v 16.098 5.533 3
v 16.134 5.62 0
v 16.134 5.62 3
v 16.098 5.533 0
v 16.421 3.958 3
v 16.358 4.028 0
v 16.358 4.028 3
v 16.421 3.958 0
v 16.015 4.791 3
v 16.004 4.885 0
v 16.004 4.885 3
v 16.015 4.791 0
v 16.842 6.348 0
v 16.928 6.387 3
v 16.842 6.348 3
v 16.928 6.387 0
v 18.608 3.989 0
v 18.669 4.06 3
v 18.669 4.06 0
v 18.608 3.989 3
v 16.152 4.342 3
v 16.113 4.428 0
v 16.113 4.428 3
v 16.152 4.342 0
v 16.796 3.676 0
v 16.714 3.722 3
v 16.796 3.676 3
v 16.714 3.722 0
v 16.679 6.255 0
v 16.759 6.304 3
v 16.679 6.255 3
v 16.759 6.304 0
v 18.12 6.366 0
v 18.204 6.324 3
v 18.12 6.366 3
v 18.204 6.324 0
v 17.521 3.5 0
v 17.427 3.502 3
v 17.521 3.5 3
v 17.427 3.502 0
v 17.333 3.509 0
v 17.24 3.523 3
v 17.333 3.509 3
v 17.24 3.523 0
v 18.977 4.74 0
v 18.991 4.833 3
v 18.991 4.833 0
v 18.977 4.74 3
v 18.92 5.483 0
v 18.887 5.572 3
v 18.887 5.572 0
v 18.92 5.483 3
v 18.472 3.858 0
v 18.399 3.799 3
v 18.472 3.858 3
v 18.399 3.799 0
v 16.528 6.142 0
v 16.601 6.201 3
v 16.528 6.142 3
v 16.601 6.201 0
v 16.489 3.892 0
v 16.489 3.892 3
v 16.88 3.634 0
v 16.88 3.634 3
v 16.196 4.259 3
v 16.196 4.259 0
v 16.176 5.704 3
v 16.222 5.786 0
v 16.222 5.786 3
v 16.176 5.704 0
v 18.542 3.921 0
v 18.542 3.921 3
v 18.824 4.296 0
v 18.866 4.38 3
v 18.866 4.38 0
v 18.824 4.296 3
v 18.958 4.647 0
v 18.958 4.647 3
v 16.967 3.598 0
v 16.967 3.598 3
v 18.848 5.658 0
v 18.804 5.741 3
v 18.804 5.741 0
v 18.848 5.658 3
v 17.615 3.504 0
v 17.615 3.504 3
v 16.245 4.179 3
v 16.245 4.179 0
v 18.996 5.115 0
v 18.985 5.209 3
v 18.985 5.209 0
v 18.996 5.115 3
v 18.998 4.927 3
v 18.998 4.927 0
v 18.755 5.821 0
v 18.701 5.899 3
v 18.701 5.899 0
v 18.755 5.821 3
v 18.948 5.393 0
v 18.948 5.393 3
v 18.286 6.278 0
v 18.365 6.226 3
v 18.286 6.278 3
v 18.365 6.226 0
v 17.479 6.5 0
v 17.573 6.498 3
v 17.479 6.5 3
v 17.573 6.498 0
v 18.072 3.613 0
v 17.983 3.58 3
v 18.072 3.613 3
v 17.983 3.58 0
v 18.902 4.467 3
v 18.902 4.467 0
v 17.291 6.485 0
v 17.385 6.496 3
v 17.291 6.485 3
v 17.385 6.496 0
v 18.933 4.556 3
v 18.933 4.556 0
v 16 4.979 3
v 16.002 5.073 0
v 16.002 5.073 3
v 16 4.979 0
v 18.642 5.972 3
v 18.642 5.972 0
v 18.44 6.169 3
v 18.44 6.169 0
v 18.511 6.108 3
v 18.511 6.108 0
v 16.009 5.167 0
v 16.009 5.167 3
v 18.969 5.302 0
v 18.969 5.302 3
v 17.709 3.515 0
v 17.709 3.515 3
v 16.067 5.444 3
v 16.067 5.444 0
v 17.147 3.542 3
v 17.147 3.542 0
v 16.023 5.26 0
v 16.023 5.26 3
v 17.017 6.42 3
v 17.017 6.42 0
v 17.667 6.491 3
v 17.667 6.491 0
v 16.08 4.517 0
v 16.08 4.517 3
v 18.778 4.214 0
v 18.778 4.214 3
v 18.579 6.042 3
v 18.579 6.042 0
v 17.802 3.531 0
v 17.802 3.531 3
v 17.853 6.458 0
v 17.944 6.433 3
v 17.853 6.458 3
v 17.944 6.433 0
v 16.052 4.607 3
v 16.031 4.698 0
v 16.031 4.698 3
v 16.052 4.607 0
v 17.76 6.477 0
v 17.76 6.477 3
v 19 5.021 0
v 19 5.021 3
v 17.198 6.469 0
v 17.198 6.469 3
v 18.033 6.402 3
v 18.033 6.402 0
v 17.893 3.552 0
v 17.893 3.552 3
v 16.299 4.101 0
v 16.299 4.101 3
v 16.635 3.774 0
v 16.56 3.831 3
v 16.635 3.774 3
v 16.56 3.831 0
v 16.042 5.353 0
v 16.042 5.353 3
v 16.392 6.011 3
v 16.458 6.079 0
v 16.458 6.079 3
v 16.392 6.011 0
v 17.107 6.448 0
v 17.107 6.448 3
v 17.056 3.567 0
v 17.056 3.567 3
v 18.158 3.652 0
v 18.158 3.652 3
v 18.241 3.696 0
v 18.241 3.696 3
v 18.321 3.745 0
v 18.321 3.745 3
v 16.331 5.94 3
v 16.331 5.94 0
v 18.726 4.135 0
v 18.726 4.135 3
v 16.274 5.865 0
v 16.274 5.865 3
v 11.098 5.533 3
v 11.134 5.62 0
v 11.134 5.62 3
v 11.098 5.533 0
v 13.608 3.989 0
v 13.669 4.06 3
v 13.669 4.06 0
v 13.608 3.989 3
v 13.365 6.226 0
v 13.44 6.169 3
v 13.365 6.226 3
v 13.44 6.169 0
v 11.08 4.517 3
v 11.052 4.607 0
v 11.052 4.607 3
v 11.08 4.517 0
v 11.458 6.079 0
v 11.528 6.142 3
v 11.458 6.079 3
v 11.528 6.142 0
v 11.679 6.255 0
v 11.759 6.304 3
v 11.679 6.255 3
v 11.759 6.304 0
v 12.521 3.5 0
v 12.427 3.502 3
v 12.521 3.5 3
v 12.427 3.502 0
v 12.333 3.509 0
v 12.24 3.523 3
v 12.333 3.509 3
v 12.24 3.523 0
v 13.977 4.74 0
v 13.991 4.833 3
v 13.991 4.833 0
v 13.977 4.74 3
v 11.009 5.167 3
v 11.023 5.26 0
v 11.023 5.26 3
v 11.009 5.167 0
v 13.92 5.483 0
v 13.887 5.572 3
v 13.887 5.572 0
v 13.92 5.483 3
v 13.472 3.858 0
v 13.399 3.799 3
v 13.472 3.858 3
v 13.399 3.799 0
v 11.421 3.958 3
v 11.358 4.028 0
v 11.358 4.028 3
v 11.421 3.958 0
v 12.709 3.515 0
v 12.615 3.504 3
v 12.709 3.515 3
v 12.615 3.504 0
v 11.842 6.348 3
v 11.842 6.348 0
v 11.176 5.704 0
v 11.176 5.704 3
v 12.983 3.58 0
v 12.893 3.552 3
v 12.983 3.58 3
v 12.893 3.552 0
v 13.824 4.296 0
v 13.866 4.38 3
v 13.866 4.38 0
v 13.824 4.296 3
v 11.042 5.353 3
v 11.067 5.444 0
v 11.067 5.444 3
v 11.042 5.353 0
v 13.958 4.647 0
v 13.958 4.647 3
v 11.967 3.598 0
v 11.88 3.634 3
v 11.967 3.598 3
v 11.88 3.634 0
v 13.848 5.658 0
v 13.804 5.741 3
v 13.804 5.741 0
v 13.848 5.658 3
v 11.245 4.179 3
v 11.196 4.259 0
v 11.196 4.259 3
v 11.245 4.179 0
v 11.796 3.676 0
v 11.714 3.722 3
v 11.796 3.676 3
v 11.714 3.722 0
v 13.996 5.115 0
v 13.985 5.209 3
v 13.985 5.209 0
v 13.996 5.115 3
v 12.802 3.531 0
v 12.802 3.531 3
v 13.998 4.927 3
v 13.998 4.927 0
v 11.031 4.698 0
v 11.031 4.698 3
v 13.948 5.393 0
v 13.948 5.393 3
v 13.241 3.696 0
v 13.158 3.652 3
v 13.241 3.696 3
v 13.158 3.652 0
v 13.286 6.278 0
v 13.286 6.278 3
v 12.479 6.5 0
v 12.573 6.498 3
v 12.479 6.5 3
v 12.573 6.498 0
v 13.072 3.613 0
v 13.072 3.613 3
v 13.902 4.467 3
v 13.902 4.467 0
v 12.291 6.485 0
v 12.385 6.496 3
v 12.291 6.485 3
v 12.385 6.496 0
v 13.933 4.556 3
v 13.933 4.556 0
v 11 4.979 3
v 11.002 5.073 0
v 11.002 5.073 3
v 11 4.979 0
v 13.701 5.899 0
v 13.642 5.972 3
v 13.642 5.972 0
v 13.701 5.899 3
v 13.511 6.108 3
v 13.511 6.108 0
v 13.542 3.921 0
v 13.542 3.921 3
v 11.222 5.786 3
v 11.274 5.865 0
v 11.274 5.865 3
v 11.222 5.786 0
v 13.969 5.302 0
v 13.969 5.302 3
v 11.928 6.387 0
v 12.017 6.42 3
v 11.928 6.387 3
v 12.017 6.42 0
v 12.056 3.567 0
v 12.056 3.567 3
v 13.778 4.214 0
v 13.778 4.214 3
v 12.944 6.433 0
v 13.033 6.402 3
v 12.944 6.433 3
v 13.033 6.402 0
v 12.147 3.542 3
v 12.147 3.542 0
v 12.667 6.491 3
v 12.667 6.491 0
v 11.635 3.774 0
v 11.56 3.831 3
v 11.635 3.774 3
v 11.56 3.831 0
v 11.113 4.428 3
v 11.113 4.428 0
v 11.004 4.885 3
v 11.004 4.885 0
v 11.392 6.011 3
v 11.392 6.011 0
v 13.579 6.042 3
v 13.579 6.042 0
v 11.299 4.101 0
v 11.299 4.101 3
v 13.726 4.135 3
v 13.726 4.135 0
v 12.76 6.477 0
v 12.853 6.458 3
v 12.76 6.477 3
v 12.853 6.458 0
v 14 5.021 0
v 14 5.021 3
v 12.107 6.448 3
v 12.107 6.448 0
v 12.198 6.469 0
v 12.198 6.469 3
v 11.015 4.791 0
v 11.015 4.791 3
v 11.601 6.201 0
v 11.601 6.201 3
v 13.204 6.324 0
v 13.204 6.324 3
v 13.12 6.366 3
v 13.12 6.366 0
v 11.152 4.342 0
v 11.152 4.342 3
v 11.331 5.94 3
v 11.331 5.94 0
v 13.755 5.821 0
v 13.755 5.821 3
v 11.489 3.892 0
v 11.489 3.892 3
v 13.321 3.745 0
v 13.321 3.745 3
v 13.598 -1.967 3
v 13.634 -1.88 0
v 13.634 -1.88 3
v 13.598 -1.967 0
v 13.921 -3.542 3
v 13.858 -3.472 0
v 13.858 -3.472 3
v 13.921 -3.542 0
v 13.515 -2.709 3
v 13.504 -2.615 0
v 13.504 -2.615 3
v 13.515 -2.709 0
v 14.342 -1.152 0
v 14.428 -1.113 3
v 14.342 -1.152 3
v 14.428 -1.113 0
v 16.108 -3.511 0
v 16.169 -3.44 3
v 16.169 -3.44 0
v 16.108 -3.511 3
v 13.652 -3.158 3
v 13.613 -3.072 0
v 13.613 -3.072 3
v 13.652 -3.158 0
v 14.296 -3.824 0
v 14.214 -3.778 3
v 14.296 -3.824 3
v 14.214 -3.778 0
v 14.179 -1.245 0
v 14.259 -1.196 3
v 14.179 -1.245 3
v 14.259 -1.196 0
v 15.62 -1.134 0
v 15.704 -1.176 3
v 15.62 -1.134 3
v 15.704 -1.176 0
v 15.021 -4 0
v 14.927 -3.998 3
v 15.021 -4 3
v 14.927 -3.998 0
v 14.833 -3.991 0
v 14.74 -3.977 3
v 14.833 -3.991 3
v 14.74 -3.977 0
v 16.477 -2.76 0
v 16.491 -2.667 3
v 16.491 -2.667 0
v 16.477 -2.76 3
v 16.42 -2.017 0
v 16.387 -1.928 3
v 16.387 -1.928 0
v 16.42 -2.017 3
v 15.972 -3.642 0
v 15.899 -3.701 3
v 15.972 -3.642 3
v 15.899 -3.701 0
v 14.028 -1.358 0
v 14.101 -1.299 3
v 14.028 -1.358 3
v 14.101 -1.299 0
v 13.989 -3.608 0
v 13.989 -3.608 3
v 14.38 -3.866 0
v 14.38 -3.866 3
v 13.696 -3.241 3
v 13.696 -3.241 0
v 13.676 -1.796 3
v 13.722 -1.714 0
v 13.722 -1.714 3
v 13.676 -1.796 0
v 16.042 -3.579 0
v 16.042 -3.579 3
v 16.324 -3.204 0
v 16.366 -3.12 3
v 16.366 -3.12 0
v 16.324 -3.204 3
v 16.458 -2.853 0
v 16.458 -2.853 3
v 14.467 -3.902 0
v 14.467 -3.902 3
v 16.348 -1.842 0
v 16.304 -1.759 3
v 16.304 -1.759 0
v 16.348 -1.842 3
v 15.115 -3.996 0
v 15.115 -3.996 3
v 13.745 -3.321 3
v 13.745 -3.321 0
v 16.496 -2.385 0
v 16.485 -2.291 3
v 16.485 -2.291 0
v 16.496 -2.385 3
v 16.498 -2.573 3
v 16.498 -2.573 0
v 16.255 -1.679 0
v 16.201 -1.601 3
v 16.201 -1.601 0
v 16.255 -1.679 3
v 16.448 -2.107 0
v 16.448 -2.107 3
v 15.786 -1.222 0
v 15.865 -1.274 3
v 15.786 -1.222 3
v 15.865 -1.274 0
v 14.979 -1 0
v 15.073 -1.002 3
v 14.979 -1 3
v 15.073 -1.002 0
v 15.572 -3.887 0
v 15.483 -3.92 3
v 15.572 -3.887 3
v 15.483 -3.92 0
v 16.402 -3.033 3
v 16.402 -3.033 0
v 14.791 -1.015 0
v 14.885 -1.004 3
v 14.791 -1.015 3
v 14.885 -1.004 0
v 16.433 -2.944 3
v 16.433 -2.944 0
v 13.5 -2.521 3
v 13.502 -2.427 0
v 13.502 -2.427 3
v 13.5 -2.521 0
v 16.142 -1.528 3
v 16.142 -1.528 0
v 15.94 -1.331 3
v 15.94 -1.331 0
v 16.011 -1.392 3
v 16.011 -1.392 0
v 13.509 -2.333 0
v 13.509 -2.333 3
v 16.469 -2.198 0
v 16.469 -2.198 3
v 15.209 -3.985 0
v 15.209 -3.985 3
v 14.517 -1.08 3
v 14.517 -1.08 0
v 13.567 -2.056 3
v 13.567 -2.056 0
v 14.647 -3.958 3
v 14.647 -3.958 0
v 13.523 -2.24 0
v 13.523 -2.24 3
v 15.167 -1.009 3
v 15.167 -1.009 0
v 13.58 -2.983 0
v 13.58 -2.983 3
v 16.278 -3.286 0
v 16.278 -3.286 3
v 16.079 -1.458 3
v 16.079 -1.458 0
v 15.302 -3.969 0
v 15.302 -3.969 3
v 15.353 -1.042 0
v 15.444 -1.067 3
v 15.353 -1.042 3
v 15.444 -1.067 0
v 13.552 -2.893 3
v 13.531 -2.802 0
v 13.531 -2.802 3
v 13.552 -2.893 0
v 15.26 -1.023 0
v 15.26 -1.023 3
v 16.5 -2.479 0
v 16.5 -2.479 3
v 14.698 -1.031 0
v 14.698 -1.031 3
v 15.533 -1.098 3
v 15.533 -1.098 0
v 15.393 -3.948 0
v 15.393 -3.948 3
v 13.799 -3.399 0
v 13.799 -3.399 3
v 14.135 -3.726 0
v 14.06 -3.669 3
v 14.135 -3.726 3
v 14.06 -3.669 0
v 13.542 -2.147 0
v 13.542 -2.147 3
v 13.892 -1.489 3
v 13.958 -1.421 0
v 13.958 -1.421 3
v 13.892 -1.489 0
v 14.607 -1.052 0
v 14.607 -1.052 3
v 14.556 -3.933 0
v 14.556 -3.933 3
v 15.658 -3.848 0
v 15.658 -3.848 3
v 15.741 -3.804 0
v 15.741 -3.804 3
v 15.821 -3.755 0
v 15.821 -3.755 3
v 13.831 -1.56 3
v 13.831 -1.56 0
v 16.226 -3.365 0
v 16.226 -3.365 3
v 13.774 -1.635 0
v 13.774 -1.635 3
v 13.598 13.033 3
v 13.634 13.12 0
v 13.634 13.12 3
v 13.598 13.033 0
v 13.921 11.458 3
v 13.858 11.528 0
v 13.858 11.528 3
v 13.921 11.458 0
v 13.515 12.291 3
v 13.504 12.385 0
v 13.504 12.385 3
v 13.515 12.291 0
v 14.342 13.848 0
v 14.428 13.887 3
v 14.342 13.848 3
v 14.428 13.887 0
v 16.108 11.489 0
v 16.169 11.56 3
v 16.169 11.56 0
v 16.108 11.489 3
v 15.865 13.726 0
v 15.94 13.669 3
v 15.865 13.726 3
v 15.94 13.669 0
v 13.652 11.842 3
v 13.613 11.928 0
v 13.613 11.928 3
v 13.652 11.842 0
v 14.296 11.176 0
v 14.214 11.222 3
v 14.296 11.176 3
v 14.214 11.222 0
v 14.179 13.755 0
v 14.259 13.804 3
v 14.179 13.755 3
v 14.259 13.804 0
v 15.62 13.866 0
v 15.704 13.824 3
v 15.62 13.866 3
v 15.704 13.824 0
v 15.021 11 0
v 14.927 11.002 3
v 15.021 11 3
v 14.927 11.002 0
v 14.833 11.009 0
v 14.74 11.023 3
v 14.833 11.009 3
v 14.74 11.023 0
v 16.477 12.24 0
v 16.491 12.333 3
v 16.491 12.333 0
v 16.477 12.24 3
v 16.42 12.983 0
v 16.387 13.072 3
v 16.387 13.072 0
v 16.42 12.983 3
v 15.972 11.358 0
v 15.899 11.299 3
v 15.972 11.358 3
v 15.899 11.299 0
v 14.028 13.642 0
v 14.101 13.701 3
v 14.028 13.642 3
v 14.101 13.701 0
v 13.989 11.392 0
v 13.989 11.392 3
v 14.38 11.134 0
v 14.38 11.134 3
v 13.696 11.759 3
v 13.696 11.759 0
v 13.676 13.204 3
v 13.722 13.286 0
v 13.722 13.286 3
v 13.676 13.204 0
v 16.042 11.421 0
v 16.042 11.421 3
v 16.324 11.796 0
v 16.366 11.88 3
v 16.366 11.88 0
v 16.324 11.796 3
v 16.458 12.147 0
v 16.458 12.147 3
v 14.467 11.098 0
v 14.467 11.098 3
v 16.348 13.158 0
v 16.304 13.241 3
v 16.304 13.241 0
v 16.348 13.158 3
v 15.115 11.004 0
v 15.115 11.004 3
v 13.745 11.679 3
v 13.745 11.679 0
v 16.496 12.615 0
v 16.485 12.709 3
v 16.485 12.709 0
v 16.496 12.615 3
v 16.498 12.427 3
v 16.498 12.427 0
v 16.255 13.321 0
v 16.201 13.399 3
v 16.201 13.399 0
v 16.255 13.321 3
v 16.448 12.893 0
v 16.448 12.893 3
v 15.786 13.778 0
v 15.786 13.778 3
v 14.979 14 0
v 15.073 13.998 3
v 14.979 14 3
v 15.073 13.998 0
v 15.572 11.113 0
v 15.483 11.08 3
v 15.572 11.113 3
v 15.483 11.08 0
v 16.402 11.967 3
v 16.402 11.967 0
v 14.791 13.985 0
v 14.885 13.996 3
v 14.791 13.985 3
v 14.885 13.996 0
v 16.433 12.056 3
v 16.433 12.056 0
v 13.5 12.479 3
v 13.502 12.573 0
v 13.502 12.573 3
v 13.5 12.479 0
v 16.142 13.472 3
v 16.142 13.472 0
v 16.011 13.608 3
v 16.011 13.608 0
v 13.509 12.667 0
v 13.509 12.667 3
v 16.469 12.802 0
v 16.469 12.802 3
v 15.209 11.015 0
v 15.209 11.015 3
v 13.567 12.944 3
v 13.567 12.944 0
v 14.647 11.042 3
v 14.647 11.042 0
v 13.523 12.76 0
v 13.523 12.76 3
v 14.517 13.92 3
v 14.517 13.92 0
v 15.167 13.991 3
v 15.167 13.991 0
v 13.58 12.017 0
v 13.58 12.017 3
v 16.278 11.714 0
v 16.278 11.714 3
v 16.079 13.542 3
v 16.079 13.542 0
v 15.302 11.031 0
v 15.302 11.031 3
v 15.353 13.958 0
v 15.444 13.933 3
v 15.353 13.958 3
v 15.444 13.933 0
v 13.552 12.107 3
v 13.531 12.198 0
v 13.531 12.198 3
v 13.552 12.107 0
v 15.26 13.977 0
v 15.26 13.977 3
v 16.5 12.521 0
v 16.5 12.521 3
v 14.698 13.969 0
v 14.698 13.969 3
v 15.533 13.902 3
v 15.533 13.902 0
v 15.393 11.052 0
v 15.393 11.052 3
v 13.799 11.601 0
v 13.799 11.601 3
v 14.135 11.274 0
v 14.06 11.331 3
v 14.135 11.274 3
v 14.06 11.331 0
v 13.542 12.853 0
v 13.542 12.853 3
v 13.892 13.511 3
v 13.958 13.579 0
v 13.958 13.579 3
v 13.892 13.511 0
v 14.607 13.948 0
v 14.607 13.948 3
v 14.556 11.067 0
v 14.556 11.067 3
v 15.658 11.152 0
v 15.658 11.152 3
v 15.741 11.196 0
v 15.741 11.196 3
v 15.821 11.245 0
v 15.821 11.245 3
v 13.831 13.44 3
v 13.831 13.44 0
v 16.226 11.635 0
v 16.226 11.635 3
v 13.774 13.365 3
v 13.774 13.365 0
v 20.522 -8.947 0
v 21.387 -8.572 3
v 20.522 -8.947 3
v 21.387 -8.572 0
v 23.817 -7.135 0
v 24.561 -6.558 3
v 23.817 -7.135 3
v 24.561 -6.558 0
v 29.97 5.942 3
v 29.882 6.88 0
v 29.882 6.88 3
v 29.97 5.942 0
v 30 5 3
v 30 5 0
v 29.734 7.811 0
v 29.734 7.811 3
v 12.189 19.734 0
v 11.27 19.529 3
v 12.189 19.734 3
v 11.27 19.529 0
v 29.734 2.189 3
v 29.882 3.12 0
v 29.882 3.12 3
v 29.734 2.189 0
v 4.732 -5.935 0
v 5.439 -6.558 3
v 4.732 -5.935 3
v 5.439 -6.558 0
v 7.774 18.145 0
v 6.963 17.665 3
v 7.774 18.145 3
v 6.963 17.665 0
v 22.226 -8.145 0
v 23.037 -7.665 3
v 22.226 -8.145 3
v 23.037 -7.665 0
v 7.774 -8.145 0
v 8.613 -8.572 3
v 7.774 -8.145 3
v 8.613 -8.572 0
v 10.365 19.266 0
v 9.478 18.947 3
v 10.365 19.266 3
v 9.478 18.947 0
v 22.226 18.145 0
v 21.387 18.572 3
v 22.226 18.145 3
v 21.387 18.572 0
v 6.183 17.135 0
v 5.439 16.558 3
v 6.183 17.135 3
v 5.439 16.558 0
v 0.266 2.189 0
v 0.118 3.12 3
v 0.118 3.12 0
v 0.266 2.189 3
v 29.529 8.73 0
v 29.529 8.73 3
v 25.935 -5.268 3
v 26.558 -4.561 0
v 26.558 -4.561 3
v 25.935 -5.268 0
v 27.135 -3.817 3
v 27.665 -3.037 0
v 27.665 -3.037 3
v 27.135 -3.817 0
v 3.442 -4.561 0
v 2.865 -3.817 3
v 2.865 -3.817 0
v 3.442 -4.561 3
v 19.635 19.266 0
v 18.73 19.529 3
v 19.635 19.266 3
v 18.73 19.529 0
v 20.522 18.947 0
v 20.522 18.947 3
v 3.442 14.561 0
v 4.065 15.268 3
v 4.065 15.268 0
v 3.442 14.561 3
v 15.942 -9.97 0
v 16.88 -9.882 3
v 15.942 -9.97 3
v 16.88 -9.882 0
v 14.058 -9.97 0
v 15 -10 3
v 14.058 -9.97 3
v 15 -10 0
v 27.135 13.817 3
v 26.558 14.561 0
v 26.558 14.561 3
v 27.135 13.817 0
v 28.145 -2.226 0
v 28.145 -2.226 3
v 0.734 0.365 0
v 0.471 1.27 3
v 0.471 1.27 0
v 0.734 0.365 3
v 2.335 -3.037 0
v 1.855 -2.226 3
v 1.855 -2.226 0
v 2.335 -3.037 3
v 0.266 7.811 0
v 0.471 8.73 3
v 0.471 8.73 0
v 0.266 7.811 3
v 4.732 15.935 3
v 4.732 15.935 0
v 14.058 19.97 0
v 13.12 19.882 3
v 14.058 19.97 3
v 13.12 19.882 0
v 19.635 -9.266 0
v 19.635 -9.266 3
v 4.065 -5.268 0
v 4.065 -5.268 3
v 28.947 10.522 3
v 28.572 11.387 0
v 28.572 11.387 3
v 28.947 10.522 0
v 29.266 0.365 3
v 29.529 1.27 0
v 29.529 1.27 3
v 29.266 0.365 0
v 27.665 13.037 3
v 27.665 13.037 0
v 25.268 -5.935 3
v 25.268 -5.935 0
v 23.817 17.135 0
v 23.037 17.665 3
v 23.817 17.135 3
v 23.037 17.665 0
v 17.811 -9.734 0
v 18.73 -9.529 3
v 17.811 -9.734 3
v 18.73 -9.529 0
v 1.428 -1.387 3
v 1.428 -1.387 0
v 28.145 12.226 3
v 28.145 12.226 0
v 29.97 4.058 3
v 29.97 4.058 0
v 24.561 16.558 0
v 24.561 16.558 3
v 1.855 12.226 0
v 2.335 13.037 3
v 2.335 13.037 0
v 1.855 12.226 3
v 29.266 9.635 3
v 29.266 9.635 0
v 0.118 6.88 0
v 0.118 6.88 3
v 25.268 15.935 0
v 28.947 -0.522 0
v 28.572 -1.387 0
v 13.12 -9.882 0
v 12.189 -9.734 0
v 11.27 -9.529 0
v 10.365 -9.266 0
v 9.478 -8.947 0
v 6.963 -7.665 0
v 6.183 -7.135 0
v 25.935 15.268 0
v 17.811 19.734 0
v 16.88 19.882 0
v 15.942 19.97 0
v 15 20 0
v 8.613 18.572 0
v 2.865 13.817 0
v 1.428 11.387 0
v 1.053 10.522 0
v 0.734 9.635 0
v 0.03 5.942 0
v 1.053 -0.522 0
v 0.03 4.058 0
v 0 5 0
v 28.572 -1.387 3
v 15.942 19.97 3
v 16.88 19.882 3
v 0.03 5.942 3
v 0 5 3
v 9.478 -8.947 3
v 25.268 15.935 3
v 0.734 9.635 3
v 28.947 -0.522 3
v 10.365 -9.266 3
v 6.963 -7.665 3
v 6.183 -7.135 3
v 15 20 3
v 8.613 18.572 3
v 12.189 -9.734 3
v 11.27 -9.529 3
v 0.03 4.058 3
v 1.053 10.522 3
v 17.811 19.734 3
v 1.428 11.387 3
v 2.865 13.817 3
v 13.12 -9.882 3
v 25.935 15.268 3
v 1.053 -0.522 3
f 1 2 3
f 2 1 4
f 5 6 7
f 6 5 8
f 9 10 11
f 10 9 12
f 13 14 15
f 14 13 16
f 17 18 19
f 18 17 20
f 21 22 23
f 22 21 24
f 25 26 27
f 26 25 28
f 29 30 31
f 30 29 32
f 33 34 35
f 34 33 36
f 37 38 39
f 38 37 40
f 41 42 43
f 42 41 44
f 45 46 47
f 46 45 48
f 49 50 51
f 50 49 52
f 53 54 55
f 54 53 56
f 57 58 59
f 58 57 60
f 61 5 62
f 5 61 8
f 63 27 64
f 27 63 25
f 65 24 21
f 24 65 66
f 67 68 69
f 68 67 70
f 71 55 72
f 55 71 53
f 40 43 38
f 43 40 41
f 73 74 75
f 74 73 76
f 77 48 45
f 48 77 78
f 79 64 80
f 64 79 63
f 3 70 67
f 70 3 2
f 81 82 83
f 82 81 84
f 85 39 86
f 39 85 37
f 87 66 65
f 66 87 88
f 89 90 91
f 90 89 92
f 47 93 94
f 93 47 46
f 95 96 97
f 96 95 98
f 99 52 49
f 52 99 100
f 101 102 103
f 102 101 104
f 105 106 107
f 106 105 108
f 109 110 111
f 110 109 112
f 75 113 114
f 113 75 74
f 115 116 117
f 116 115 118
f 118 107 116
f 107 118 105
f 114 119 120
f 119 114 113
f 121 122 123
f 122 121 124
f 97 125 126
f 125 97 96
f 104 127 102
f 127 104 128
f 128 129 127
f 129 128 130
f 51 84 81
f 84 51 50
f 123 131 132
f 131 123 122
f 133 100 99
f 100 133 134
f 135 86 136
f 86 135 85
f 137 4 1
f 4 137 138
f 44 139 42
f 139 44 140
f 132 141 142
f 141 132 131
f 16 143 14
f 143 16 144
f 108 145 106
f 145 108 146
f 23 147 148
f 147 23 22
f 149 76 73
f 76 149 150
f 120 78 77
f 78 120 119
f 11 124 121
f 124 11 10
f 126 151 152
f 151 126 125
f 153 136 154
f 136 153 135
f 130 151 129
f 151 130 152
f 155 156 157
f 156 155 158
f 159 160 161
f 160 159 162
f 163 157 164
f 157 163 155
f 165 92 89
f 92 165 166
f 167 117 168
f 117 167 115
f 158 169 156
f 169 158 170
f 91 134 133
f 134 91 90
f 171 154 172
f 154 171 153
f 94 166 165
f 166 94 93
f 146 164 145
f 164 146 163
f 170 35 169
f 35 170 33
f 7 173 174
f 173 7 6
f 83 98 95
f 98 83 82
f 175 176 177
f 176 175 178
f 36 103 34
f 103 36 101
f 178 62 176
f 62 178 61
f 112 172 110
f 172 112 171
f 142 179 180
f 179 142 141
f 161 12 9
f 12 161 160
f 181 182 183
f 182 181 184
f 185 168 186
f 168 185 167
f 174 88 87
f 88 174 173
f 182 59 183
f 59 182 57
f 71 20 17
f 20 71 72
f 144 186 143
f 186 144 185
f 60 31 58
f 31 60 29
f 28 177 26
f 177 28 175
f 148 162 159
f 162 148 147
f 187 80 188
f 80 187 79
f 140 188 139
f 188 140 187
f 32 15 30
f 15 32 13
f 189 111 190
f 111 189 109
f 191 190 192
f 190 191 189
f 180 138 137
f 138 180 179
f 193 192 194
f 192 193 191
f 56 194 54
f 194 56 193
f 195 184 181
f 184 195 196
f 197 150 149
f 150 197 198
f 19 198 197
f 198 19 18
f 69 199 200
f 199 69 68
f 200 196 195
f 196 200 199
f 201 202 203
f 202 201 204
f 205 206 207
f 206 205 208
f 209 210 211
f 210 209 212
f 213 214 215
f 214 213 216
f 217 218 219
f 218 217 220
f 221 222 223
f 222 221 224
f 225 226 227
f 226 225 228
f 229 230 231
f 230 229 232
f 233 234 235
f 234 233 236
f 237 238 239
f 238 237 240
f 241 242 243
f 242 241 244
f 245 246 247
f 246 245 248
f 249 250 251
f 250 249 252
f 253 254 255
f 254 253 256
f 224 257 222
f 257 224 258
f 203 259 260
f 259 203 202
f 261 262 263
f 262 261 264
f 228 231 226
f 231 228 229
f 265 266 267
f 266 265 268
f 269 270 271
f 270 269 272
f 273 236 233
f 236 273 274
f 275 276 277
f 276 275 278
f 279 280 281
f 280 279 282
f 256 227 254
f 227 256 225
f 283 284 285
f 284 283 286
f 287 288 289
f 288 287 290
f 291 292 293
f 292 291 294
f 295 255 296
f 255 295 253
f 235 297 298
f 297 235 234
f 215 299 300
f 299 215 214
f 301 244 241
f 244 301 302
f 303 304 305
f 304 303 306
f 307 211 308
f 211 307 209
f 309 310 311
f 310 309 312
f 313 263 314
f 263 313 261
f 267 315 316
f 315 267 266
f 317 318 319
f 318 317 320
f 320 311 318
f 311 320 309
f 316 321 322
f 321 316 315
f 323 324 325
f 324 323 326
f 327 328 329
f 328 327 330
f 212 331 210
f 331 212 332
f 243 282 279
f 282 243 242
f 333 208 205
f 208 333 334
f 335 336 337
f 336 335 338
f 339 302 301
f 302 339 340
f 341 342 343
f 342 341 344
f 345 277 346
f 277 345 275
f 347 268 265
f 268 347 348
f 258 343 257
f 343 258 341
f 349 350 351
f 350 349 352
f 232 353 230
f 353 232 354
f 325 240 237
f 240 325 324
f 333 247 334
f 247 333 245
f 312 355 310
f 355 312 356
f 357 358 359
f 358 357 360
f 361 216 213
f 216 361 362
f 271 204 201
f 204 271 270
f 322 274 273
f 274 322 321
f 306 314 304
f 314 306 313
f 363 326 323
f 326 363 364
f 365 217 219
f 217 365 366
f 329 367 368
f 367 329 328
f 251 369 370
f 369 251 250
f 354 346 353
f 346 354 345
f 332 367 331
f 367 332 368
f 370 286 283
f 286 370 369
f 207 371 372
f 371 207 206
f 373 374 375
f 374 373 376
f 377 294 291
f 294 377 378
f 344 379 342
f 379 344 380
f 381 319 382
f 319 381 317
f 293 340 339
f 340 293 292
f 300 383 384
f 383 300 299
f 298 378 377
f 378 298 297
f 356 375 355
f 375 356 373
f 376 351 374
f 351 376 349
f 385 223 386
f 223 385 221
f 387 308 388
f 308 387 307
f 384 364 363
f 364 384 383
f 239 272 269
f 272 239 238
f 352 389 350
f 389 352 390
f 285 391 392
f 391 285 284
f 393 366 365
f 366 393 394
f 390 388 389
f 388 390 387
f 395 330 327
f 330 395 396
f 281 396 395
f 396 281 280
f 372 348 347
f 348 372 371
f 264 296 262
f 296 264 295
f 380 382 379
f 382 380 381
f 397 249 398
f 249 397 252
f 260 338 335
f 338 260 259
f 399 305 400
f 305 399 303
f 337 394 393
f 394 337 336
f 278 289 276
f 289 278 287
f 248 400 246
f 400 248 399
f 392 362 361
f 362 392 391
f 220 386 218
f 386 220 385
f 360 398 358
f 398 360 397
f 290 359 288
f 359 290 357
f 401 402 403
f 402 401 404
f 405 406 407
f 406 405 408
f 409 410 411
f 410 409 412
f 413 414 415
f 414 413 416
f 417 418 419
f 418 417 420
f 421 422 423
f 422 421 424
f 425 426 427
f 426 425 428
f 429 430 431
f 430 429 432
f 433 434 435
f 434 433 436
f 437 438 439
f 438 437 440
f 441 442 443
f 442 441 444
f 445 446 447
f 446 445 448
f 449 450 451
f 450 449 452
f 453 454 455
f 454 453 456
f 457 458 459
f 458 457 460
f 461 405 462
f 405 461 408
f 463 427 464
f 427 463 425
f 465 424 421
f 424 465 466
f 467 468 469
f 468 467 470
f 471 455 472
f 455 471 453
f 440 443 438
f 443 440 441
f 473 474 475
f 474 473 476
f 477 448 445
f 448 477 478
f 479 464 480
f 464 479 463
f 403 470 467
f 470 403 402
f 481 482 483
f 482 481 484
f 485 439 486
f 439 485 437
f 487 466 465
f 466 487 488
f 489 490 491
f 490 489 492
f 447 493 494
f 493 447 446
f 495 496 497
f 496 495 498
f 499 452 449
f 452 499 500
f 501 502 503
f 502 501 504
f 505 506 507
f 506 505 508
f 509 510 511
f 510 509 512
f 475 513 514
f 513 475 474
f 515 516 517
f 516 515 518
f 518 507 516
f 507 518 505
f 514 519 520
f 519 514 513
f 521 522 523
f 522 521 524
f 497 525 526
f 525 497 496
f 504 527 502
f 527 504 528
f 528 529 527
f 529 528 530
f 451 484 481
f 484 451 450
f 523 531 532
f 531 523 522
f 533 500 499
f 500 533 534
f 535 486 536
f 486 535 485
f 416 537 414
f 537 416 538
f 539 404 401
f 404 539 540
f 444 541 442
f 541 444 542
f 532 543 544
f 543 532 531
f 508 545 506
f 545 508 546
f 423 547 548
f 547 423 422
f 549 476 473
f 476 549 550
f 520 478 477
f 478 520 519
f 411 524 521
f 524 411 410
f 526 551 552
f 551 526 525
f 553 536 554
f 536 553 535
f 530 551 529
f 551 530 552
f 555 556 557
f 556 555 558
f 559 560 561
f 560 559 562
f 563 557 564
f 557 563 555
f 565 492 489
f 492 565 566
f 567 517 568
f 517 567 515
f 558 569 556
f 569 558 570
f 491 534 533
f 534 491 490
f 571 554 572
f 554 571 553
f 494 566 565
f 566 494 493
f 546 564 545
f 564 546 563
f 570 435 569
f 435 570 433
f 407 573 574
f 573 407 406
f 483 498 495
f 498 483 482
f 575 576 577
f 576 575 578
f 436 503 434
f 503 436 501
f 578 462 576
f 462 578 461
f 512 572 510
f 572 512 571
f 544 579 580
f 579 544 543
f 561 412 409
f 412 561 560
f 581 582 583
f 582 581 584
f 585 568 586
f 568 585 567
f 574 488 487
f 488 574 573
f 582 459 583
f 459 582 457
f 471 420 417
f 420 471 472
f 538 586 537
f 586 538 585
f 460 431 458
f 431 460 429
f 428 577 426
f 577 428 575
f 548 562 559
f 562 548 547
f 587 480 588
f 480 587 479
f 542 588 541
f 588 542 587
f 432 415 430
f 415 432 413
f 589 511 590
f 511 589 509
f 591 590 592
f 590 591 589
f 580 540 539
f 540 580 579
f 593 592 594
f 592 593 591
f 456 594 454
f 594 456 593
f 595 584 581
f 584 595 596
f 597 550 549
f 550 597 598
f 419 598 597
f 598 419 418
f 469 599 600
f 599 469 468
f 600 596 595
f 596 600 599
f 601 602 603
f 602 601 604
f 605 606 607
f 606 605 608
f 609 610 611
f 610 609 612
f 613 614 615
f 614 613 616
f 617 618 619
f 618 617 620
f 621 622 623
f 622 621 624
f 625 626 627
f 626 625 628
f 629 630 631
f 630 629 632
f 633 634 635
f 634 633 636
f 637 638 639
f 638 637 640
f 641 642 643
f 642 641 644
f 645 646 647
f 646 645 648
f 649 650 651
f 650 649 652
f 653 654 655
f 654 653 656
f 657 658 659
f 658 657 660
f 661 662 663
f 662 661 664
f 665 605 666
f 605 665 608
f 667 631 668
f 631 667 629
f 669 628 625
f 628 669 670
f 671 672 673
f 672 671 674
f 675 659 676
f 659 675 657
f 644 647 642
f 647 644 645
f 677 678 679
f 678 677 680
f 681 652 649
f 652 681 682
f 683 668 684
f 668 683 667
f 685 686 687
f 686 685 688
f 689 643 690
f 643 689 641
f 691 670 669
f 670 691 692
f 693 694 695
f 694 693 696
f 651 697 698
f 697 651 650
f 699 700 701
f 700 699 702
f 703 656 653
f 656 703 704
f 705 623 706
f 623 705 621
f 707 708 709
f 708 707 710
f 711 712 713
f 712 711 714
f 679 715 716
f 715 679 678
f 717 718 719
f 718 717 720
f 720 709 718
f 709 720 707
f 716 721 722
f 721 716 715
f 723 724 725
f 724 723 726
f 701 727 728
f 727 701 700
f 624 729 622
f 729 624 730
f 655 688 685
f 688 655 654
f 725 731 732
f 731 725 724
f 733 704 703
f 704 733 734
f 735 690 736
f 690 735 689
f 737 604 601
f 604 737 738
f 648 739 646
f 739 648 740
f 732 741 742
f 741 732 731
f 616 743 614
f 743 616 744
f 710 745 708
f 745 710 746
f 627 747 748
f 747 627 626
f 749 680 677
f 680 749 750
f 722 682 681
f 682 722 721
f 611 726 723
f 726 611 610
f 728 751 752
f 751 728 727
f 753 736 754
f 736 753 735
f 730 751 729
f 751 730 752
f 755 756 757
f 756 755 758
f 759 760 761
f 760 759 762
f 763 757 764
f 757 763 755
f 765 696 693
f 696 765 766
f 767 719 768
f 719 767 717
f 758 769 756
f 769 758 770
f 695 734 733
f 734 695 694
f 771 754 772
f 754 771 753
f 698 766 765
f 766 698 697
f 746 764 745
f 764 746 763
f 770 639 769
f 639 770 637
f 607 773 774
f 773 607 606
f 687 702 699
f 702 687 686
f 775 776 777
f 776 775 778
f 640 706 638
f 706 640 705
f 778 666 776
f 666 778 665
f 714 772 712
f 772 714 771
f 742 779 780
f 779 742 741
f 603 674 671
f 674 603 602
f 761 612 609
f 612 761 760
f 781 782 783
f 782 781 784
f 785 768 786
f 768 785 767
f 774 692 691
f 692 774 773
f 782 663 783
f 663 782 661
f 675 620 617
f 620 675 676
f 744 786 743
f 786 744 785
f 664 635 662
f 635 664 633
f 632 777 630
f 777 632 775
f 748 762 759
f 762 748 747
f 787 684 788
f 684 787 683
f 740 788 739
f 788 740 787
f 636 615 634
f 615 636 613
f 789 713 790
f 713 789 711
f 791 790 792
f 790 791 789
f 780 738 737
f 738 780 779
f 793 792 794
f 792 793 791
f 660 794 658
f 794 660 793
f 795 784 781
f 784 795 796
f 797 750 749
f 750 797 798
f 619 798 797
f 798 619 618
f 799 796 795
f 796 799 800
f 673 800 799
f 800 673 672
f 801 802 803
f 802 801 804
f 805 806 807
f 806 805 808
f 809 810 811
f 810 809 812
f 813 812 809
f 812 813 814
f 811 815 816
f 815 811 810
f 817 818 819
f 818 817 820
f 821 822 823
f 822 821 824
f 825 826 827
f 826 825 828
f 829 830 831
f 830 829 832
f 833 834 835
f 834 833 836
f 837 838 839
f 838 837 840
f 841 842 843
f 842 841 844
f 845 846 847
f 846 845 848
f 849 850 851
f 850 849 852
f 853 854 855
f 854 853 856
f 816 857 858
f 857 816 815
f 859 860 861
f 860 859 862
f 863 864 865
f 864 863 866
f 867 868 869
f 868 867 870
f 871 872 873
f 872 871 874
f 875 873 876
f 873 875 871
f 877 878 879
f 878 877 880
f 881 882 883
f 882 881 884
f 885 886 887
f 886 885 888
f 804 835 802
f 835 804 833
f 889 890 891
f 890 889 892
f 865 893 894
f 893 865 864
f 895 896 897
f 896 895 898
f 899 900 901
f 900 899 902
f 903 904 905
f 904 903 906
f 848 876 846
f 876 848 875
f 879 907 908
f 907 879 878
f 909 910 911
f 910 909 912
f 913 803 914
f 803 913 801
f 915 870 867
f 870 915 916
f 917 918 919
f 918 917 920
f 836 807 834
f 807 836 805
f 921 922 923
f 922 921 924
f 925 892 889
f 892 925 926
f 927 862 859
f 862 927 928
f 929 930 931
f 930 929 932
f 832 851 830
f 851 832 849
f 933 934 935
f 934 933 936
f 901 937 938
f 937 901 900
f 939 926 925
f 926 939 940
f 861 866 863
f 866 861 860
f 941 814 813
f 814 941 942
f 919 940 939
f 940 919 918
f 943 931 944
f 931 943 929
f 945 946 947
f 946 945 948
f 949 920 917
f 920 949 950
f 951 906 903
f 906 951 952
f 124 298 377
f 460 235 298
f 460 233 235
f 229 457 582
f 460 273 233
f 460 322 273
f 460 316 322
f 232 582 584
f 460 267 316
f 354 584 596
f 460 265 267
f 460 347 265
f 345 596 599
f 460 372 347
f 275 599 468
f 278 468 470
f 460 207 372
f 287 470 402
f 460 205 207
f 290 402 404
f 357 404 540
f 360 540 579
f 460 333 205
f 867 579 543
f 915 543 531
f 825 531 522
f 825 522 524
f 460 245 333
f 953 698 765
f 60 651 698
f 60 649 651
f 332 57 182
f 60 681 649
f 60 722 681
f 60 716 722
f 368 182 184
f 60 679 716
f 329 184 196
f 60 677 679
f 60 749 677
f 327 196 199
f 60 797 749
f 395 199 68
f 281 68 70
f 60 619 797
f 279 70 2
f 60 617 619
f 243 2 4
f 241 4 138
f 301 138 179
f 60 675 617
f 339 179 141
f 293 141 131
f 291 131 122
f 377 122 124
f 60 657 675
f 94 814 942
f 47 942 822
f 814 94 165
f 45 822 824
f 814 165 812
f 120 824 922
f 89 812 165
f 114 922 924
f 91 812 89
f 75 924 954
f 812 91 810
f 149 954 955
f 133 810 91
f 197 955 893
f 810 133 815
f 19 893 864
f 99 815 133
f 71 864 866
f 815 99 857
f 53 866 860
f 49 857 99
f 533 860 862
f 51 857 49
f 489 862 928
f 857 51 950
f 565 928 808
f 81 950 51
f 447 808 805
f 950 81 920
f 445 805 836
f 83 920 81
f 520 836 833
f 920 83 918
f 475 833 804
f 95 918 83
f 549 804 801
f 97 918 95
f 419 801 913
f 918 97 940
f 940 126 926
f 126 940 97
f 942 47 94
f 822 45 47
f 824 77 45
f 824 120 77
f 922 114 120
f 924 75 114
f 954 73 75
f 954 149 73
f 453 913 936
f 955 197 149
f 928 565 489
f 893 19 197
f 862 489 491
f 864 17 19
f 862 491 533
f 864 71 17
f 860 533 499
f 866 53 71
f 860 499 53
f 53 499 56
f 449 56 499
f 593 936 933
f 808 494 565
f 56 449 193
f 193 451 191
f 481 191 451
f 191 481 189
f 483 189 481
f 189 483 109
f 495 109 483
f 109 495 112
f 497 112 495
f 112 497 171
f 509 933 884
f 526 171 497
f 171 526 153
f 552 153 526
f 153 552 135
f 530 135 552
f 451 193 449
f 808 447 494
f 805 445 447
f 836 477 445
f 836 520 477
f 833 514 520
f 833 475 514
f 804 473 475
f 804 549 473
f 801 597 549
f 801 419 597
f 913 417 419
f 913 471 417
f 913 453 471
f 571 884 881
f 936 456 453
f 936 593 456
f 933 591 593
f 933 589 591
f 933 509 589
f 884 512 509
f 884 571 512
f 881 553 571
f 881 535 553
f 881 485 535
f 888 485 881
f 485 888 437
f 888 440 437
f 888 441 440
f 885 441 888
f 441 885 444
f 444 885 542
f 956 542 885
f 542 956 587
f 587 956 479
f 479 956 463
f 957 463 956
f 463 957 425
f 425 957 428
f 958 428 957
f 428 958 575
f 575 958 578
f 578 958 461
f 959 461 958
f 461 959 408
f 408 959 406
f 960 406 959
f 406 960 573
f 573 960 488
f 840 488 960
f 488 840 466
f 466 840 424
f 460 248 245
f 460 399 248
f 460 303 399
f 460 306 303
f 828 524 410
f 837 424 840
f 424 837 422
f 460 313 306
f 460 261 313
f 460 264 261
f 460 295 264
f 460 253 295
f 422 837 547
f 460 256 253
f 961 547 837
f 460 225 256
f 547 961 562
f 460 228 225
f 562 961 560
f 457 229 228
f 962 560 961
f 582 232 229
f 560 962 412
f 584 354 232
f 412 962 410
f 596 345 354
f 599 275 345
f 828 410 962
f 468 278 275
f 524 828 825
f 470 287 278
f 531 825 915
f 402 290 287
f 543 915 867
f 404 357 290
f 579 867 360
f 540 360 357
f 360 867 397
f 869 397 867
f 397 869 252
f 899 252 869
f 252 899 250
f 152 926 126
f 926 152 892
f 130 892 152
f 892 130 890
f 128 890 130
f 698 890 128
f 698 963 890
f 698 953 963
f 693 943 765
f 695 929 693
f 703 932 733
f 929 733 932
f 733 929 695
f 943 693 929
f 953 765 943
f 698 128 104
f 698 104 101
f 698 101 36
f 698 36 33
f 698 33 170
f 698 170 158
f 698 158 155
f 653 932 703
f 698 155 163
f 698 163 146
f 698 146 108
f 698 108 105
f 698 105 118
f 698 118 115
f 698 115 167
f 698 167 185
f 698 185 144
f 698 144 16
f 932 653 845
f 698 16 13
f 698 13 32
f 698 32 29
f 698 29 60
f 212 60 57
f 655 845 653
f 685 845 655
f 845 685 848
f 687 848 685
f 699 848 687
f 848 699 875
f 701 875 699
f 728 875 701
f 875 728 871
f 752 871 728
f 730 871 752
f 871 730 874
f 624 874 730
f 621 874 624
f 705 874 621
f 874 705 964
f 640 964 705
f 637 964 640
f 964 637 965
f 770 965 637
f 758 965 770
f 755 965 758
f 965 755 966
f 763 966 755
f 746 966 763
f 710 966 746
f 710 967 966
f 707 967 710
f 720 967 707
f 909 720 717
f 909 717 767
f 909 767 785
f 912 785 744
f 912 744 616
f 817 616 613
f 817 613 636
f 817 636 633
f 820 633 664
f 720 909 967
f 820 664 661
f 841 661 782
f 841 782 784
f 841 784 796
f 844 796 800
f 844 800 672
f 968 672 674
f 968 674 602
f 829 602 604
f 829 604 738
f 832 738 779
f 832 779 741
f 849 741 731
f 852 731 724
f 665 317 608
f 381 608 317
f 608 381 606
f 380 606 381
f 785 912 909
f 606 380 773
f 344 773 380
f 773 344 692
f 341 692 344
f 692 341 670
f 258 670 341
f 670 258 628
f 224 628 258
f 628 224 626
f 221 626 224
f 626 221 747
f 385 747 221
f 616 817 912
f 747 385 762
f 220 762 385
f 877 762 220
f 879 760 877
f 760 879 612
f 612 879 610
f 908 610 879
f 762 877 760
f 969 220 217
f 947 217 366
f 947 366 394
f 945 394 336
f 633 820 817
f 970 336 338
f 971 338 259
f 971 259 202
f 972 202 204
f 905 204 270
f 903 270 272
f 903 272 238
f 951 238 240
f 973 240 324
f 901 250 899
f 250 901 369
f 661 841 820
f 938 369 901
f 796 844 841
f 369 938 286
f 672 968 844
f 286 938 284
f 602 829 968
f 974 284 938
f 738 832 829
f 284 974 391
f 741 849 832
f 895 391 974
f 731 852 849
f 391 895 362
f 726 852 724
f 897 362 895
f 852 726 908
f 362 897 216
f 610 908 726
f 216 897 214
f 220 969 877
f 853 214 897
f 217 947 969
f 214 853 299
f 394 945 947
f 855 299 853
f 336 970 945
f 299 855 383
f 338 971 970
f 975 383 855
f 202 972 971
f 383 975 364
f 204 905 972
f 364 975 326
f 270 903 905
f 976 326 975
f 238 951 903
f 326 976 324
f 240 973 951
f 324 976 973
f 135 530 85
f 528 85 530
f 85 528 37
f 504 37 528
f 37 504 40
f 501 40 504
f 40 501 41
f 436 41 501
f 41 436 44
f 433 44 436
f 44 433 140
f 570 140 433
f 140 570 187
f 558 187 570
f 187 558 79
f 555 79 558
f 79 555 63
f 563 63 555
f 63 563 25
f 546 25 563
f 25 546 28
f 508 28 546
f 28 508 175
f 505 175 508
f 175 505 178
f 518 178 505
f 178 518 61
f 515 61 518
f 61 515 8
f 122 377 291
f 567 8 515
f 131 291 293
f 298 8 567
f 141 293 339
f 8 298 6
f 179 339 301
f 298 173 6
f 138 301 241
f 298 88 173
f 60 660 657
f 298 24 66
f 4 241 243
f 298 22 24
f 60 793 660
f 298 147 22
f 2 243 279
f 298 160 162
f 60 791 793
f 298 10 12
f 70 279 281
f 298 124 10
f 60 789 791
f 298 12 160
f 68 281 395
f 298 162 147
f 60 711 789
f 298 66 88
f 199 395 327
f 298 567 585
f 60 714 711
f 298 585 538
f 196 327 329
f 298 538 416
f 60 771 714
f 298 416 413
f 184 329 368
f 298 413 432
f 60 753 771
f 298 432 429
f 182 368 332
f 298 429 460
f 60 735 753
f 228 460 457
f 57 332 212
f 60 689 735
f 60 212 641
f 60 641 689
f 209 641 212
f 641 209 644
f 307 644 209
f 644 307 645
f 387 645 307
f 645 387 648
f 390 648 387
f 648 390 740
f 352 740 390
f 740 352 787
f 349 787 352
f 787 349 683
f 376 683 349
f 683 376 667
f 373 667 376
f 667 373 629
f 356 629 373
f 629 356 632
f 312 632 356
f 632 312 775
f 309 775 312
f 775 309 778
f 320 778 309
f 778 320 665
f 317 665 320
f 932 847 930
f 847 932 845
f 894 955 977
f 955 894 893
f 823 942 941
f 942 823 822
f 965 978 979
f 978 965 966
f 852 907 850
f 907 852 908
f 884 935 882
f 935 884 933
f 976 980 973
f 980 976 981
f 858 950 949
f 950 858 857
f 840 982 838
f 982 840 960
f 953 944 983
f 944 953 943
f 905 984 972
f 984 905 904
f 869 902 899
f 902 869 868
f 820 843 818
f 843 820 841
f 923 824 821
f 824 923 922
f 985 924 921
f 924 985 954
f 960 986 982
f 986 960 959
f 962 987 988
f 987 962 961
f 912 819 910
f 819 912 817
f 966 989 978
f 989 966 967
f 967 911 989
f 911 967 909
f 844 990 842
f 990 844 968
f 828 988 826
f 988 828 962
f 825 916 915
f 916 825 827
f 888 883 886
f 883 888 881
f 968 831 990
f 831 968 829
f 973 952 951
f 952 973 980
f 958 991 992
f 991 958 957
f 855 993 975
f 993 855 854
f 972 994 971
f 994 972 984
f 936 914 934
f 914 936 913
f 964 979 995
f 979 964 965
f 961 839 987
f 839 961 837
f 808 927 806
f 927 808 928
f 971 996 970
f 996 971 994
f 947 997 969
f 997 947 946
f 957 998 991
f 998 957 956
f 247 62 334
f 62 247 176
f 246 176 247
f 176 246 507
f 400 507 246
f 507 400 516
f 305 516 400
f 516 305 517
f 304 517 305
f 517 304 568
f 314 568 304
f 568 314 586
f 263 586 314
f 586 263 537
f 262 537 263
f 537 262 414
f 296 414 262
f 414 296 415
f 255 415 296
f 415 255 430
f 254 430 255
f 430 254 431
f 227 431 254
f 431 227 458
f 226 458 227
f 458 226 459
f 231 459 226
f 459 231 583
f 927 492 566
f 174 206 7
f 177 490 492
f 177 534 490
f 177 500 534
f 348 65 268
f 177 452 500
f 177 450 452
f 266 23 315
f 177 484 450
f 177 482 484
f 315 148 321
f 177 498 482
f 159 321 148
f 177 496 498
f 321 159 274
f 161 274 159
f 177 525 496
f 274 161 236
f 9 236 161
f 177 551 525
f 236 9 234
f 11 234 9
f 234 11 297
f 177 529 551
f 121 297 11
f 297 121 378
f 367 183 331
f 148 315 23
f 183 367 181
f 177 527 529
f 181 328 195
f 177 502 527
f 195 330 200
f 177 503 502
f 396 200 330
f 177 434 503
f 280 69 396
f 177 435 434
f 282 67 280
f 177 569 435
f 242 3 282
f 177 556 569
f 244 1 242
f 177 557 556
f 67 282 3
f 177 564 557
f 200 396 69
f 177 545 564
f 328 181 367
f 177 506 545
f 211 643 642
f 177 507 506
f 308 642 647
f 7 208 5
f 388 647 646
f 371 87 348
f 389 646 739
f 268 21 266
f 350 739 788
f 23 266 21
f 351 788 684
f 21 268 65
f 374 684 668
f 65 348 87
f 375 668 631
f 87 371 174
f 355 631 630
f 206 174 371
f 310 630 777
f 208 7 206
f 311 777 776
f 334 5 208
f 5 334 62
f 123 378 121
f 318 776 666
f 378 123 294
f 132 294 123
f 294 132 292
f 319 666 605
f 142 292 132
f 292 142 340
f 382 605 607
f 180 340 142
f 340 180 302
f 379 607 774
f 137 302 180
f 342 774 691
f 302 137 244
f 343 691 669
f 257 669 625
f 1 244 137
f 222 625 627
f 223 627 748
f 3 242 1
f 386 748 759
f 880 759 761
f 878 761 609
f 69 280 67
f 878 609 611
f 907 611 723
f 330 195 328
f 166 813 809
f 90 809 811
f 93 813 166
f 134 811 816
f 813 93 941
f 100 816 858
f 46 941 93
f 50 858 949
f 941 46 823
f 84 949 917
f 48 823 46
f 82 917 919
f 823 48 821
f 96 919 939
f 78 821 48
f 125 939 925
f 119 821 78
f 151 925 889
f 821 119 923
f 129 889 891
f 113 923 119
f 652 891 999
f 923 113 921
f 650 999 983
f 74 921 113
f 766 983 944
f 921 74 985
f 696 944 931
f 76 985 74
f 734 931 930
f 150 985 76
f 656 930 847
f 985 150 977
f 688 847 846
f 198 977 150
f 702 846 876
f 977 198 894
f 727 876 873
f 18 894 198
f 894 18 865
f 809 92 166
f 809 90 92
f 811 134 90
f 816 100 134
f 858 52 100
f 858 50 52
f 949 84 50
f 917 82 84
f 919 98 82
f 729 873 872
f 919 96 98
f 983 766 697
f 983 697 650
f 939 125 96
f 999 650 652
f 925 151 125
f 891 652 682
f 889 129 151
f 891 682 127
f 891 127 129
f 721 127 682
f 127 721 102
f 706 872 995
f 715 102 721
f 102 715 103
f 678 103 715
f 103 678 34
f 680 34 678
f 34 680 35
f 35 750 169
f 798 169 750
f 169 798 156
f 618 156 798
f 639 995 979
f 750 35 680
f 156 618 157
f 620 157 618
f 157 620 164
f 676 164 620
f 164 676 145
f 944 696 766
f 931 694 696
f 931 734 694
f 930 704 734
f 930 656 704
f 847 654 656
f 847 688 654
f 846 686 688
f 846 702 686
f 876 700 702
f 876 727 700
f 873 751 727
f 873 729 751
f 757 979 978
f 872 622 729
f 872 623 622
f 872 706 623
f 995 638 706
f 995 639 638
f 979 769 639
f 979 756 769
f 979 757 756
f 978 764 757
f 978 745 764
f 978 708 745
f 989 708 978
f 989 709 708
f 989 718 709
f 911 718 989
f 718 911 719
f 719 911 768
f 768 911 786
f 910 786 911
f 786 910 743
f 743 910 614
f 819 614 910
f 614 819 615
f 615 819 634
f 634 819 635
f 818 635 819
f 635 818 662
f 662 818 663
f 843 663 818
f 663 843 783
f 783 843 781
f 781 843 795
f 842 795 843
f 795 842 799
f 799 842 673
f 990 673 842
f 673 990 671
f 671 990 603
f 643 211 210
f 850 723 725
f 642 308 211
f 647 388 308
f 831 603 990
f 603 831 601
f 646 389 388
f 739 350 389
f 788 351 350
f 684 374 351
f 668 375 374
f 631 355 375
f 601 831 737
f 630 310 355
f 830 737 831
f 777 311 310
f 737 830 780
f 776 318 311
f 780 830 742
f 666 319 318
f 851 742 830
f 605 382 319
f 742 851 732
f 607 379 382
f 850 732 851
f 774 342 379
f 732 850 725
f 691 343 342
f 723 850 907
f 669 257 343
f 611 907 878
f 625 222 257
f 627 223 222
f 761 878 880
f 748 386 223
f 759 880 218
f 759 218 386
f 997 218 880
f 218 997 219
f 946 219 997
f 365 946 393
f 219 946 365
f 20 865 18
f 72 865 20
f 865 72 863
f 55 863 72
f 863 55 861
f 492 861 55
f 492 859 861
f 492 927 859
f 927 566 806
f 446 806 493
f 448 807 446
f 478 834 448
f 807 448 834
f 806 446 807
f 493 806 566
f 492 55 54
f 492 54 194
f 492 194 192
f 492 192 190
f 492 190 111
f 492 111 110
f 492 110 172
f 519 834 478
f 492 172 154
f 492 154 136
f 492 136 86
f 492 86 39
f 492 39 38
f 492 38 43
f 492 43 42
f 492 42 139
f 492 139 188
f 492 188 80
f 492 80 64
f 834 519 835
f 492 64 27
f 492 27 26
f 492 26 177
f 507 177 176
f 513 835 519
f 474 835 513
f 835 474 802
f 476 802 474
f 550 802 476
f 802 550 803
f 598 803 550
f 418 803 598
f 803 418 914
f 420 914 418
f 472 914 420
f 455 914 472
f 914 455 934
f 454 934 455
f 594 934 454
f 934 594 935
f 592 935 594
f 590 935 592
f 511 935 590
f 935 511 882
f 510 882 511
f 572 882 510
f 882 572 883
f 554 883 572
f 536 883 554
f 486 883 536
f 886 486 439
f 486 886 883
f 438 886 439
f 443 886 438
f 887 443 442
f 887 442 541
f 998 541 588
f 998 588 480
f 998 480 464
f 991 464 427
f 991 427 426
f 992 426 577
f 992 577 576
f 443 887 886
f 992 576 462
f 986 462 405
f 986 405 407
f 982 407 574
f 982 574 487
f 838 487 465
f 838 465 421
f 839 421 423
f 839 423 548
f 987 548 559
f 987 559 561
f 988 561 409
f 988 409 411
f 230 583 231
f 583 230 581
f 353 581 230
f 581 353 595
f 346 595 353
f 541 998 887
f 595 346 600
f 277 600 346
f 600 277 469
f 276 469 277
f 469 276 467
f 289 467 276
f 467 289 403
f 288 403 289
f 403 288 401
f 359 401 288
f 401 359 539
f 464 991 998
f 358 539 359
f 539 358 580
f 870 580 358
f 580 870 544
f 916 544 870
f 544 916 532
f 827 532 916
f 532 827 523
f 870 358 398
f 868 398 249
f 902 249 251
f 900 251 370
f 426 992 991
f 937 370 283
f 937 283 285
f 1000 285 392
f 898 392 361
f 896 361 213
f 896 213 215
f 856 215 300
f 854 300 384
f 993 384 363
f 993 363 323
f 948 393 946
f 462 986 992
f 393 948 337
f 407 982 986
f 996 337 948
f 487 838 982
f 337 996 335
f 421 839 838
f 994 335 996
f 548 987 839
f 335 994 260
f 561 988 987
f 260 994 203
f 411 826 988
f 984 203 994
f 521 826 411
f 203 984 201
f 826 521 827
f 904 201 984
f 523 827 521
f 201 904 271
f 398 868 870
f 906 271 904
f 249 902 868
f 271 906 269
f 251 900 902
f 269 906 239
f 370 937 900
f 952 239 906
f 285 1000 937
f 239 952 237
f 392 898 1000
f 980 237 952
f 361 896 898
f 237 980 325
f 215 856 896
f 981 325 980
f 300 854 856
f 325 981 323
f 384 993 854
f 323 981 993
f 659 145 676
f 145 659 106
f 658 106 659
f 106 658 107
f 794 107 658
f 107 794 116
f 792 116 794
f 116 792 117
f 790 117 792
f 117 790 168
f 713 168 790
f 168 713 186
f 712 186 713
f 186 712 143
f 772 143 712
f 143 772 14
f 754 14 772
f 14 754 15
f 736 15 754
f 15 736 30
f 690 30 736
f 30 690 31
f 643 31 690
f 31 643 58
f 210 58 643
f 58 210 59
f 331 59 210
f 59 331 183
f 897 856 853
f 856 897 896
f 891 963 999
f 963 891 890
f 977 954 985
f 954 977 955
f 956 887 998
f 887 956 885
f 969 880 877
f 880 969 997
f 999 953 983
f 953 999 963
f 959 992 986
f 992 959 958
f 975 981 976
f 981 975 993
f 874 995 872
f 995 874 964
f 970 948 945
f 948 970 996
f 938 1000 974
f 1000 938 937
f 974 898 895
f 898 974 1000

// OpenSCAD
difference(){
	union(){        

        translate([15,5,0]){
                cylinder(h=3, r=15, $fn=100, center=false);
        }
	}
	union() {



        translate([17.5,5,-10]){
            rotate(a = [0,0,-10]) {
                cylinder(h=500, r=1.5, $fn=100, center=false);
            }
        }	
        translate([12.5,5,-10]){
            rotate(a = [0,0,-10]) {
                cylinder(h=500, r=1.5, $fn=100, center=false);
            }
        }	
        translate([15,-2.5,-10]){
            rotate(a = [0,0,-10]) {
                cylinder(h=500, r=1.5, $fn=100, center=false);
            }
        }	
        translate([15,12.5,-10]){
            rotate(a = [0,0,-10]) {
                cylinder(h=500, r=1.5, $fn=100, center=false);
            }
        }	




	}
}
